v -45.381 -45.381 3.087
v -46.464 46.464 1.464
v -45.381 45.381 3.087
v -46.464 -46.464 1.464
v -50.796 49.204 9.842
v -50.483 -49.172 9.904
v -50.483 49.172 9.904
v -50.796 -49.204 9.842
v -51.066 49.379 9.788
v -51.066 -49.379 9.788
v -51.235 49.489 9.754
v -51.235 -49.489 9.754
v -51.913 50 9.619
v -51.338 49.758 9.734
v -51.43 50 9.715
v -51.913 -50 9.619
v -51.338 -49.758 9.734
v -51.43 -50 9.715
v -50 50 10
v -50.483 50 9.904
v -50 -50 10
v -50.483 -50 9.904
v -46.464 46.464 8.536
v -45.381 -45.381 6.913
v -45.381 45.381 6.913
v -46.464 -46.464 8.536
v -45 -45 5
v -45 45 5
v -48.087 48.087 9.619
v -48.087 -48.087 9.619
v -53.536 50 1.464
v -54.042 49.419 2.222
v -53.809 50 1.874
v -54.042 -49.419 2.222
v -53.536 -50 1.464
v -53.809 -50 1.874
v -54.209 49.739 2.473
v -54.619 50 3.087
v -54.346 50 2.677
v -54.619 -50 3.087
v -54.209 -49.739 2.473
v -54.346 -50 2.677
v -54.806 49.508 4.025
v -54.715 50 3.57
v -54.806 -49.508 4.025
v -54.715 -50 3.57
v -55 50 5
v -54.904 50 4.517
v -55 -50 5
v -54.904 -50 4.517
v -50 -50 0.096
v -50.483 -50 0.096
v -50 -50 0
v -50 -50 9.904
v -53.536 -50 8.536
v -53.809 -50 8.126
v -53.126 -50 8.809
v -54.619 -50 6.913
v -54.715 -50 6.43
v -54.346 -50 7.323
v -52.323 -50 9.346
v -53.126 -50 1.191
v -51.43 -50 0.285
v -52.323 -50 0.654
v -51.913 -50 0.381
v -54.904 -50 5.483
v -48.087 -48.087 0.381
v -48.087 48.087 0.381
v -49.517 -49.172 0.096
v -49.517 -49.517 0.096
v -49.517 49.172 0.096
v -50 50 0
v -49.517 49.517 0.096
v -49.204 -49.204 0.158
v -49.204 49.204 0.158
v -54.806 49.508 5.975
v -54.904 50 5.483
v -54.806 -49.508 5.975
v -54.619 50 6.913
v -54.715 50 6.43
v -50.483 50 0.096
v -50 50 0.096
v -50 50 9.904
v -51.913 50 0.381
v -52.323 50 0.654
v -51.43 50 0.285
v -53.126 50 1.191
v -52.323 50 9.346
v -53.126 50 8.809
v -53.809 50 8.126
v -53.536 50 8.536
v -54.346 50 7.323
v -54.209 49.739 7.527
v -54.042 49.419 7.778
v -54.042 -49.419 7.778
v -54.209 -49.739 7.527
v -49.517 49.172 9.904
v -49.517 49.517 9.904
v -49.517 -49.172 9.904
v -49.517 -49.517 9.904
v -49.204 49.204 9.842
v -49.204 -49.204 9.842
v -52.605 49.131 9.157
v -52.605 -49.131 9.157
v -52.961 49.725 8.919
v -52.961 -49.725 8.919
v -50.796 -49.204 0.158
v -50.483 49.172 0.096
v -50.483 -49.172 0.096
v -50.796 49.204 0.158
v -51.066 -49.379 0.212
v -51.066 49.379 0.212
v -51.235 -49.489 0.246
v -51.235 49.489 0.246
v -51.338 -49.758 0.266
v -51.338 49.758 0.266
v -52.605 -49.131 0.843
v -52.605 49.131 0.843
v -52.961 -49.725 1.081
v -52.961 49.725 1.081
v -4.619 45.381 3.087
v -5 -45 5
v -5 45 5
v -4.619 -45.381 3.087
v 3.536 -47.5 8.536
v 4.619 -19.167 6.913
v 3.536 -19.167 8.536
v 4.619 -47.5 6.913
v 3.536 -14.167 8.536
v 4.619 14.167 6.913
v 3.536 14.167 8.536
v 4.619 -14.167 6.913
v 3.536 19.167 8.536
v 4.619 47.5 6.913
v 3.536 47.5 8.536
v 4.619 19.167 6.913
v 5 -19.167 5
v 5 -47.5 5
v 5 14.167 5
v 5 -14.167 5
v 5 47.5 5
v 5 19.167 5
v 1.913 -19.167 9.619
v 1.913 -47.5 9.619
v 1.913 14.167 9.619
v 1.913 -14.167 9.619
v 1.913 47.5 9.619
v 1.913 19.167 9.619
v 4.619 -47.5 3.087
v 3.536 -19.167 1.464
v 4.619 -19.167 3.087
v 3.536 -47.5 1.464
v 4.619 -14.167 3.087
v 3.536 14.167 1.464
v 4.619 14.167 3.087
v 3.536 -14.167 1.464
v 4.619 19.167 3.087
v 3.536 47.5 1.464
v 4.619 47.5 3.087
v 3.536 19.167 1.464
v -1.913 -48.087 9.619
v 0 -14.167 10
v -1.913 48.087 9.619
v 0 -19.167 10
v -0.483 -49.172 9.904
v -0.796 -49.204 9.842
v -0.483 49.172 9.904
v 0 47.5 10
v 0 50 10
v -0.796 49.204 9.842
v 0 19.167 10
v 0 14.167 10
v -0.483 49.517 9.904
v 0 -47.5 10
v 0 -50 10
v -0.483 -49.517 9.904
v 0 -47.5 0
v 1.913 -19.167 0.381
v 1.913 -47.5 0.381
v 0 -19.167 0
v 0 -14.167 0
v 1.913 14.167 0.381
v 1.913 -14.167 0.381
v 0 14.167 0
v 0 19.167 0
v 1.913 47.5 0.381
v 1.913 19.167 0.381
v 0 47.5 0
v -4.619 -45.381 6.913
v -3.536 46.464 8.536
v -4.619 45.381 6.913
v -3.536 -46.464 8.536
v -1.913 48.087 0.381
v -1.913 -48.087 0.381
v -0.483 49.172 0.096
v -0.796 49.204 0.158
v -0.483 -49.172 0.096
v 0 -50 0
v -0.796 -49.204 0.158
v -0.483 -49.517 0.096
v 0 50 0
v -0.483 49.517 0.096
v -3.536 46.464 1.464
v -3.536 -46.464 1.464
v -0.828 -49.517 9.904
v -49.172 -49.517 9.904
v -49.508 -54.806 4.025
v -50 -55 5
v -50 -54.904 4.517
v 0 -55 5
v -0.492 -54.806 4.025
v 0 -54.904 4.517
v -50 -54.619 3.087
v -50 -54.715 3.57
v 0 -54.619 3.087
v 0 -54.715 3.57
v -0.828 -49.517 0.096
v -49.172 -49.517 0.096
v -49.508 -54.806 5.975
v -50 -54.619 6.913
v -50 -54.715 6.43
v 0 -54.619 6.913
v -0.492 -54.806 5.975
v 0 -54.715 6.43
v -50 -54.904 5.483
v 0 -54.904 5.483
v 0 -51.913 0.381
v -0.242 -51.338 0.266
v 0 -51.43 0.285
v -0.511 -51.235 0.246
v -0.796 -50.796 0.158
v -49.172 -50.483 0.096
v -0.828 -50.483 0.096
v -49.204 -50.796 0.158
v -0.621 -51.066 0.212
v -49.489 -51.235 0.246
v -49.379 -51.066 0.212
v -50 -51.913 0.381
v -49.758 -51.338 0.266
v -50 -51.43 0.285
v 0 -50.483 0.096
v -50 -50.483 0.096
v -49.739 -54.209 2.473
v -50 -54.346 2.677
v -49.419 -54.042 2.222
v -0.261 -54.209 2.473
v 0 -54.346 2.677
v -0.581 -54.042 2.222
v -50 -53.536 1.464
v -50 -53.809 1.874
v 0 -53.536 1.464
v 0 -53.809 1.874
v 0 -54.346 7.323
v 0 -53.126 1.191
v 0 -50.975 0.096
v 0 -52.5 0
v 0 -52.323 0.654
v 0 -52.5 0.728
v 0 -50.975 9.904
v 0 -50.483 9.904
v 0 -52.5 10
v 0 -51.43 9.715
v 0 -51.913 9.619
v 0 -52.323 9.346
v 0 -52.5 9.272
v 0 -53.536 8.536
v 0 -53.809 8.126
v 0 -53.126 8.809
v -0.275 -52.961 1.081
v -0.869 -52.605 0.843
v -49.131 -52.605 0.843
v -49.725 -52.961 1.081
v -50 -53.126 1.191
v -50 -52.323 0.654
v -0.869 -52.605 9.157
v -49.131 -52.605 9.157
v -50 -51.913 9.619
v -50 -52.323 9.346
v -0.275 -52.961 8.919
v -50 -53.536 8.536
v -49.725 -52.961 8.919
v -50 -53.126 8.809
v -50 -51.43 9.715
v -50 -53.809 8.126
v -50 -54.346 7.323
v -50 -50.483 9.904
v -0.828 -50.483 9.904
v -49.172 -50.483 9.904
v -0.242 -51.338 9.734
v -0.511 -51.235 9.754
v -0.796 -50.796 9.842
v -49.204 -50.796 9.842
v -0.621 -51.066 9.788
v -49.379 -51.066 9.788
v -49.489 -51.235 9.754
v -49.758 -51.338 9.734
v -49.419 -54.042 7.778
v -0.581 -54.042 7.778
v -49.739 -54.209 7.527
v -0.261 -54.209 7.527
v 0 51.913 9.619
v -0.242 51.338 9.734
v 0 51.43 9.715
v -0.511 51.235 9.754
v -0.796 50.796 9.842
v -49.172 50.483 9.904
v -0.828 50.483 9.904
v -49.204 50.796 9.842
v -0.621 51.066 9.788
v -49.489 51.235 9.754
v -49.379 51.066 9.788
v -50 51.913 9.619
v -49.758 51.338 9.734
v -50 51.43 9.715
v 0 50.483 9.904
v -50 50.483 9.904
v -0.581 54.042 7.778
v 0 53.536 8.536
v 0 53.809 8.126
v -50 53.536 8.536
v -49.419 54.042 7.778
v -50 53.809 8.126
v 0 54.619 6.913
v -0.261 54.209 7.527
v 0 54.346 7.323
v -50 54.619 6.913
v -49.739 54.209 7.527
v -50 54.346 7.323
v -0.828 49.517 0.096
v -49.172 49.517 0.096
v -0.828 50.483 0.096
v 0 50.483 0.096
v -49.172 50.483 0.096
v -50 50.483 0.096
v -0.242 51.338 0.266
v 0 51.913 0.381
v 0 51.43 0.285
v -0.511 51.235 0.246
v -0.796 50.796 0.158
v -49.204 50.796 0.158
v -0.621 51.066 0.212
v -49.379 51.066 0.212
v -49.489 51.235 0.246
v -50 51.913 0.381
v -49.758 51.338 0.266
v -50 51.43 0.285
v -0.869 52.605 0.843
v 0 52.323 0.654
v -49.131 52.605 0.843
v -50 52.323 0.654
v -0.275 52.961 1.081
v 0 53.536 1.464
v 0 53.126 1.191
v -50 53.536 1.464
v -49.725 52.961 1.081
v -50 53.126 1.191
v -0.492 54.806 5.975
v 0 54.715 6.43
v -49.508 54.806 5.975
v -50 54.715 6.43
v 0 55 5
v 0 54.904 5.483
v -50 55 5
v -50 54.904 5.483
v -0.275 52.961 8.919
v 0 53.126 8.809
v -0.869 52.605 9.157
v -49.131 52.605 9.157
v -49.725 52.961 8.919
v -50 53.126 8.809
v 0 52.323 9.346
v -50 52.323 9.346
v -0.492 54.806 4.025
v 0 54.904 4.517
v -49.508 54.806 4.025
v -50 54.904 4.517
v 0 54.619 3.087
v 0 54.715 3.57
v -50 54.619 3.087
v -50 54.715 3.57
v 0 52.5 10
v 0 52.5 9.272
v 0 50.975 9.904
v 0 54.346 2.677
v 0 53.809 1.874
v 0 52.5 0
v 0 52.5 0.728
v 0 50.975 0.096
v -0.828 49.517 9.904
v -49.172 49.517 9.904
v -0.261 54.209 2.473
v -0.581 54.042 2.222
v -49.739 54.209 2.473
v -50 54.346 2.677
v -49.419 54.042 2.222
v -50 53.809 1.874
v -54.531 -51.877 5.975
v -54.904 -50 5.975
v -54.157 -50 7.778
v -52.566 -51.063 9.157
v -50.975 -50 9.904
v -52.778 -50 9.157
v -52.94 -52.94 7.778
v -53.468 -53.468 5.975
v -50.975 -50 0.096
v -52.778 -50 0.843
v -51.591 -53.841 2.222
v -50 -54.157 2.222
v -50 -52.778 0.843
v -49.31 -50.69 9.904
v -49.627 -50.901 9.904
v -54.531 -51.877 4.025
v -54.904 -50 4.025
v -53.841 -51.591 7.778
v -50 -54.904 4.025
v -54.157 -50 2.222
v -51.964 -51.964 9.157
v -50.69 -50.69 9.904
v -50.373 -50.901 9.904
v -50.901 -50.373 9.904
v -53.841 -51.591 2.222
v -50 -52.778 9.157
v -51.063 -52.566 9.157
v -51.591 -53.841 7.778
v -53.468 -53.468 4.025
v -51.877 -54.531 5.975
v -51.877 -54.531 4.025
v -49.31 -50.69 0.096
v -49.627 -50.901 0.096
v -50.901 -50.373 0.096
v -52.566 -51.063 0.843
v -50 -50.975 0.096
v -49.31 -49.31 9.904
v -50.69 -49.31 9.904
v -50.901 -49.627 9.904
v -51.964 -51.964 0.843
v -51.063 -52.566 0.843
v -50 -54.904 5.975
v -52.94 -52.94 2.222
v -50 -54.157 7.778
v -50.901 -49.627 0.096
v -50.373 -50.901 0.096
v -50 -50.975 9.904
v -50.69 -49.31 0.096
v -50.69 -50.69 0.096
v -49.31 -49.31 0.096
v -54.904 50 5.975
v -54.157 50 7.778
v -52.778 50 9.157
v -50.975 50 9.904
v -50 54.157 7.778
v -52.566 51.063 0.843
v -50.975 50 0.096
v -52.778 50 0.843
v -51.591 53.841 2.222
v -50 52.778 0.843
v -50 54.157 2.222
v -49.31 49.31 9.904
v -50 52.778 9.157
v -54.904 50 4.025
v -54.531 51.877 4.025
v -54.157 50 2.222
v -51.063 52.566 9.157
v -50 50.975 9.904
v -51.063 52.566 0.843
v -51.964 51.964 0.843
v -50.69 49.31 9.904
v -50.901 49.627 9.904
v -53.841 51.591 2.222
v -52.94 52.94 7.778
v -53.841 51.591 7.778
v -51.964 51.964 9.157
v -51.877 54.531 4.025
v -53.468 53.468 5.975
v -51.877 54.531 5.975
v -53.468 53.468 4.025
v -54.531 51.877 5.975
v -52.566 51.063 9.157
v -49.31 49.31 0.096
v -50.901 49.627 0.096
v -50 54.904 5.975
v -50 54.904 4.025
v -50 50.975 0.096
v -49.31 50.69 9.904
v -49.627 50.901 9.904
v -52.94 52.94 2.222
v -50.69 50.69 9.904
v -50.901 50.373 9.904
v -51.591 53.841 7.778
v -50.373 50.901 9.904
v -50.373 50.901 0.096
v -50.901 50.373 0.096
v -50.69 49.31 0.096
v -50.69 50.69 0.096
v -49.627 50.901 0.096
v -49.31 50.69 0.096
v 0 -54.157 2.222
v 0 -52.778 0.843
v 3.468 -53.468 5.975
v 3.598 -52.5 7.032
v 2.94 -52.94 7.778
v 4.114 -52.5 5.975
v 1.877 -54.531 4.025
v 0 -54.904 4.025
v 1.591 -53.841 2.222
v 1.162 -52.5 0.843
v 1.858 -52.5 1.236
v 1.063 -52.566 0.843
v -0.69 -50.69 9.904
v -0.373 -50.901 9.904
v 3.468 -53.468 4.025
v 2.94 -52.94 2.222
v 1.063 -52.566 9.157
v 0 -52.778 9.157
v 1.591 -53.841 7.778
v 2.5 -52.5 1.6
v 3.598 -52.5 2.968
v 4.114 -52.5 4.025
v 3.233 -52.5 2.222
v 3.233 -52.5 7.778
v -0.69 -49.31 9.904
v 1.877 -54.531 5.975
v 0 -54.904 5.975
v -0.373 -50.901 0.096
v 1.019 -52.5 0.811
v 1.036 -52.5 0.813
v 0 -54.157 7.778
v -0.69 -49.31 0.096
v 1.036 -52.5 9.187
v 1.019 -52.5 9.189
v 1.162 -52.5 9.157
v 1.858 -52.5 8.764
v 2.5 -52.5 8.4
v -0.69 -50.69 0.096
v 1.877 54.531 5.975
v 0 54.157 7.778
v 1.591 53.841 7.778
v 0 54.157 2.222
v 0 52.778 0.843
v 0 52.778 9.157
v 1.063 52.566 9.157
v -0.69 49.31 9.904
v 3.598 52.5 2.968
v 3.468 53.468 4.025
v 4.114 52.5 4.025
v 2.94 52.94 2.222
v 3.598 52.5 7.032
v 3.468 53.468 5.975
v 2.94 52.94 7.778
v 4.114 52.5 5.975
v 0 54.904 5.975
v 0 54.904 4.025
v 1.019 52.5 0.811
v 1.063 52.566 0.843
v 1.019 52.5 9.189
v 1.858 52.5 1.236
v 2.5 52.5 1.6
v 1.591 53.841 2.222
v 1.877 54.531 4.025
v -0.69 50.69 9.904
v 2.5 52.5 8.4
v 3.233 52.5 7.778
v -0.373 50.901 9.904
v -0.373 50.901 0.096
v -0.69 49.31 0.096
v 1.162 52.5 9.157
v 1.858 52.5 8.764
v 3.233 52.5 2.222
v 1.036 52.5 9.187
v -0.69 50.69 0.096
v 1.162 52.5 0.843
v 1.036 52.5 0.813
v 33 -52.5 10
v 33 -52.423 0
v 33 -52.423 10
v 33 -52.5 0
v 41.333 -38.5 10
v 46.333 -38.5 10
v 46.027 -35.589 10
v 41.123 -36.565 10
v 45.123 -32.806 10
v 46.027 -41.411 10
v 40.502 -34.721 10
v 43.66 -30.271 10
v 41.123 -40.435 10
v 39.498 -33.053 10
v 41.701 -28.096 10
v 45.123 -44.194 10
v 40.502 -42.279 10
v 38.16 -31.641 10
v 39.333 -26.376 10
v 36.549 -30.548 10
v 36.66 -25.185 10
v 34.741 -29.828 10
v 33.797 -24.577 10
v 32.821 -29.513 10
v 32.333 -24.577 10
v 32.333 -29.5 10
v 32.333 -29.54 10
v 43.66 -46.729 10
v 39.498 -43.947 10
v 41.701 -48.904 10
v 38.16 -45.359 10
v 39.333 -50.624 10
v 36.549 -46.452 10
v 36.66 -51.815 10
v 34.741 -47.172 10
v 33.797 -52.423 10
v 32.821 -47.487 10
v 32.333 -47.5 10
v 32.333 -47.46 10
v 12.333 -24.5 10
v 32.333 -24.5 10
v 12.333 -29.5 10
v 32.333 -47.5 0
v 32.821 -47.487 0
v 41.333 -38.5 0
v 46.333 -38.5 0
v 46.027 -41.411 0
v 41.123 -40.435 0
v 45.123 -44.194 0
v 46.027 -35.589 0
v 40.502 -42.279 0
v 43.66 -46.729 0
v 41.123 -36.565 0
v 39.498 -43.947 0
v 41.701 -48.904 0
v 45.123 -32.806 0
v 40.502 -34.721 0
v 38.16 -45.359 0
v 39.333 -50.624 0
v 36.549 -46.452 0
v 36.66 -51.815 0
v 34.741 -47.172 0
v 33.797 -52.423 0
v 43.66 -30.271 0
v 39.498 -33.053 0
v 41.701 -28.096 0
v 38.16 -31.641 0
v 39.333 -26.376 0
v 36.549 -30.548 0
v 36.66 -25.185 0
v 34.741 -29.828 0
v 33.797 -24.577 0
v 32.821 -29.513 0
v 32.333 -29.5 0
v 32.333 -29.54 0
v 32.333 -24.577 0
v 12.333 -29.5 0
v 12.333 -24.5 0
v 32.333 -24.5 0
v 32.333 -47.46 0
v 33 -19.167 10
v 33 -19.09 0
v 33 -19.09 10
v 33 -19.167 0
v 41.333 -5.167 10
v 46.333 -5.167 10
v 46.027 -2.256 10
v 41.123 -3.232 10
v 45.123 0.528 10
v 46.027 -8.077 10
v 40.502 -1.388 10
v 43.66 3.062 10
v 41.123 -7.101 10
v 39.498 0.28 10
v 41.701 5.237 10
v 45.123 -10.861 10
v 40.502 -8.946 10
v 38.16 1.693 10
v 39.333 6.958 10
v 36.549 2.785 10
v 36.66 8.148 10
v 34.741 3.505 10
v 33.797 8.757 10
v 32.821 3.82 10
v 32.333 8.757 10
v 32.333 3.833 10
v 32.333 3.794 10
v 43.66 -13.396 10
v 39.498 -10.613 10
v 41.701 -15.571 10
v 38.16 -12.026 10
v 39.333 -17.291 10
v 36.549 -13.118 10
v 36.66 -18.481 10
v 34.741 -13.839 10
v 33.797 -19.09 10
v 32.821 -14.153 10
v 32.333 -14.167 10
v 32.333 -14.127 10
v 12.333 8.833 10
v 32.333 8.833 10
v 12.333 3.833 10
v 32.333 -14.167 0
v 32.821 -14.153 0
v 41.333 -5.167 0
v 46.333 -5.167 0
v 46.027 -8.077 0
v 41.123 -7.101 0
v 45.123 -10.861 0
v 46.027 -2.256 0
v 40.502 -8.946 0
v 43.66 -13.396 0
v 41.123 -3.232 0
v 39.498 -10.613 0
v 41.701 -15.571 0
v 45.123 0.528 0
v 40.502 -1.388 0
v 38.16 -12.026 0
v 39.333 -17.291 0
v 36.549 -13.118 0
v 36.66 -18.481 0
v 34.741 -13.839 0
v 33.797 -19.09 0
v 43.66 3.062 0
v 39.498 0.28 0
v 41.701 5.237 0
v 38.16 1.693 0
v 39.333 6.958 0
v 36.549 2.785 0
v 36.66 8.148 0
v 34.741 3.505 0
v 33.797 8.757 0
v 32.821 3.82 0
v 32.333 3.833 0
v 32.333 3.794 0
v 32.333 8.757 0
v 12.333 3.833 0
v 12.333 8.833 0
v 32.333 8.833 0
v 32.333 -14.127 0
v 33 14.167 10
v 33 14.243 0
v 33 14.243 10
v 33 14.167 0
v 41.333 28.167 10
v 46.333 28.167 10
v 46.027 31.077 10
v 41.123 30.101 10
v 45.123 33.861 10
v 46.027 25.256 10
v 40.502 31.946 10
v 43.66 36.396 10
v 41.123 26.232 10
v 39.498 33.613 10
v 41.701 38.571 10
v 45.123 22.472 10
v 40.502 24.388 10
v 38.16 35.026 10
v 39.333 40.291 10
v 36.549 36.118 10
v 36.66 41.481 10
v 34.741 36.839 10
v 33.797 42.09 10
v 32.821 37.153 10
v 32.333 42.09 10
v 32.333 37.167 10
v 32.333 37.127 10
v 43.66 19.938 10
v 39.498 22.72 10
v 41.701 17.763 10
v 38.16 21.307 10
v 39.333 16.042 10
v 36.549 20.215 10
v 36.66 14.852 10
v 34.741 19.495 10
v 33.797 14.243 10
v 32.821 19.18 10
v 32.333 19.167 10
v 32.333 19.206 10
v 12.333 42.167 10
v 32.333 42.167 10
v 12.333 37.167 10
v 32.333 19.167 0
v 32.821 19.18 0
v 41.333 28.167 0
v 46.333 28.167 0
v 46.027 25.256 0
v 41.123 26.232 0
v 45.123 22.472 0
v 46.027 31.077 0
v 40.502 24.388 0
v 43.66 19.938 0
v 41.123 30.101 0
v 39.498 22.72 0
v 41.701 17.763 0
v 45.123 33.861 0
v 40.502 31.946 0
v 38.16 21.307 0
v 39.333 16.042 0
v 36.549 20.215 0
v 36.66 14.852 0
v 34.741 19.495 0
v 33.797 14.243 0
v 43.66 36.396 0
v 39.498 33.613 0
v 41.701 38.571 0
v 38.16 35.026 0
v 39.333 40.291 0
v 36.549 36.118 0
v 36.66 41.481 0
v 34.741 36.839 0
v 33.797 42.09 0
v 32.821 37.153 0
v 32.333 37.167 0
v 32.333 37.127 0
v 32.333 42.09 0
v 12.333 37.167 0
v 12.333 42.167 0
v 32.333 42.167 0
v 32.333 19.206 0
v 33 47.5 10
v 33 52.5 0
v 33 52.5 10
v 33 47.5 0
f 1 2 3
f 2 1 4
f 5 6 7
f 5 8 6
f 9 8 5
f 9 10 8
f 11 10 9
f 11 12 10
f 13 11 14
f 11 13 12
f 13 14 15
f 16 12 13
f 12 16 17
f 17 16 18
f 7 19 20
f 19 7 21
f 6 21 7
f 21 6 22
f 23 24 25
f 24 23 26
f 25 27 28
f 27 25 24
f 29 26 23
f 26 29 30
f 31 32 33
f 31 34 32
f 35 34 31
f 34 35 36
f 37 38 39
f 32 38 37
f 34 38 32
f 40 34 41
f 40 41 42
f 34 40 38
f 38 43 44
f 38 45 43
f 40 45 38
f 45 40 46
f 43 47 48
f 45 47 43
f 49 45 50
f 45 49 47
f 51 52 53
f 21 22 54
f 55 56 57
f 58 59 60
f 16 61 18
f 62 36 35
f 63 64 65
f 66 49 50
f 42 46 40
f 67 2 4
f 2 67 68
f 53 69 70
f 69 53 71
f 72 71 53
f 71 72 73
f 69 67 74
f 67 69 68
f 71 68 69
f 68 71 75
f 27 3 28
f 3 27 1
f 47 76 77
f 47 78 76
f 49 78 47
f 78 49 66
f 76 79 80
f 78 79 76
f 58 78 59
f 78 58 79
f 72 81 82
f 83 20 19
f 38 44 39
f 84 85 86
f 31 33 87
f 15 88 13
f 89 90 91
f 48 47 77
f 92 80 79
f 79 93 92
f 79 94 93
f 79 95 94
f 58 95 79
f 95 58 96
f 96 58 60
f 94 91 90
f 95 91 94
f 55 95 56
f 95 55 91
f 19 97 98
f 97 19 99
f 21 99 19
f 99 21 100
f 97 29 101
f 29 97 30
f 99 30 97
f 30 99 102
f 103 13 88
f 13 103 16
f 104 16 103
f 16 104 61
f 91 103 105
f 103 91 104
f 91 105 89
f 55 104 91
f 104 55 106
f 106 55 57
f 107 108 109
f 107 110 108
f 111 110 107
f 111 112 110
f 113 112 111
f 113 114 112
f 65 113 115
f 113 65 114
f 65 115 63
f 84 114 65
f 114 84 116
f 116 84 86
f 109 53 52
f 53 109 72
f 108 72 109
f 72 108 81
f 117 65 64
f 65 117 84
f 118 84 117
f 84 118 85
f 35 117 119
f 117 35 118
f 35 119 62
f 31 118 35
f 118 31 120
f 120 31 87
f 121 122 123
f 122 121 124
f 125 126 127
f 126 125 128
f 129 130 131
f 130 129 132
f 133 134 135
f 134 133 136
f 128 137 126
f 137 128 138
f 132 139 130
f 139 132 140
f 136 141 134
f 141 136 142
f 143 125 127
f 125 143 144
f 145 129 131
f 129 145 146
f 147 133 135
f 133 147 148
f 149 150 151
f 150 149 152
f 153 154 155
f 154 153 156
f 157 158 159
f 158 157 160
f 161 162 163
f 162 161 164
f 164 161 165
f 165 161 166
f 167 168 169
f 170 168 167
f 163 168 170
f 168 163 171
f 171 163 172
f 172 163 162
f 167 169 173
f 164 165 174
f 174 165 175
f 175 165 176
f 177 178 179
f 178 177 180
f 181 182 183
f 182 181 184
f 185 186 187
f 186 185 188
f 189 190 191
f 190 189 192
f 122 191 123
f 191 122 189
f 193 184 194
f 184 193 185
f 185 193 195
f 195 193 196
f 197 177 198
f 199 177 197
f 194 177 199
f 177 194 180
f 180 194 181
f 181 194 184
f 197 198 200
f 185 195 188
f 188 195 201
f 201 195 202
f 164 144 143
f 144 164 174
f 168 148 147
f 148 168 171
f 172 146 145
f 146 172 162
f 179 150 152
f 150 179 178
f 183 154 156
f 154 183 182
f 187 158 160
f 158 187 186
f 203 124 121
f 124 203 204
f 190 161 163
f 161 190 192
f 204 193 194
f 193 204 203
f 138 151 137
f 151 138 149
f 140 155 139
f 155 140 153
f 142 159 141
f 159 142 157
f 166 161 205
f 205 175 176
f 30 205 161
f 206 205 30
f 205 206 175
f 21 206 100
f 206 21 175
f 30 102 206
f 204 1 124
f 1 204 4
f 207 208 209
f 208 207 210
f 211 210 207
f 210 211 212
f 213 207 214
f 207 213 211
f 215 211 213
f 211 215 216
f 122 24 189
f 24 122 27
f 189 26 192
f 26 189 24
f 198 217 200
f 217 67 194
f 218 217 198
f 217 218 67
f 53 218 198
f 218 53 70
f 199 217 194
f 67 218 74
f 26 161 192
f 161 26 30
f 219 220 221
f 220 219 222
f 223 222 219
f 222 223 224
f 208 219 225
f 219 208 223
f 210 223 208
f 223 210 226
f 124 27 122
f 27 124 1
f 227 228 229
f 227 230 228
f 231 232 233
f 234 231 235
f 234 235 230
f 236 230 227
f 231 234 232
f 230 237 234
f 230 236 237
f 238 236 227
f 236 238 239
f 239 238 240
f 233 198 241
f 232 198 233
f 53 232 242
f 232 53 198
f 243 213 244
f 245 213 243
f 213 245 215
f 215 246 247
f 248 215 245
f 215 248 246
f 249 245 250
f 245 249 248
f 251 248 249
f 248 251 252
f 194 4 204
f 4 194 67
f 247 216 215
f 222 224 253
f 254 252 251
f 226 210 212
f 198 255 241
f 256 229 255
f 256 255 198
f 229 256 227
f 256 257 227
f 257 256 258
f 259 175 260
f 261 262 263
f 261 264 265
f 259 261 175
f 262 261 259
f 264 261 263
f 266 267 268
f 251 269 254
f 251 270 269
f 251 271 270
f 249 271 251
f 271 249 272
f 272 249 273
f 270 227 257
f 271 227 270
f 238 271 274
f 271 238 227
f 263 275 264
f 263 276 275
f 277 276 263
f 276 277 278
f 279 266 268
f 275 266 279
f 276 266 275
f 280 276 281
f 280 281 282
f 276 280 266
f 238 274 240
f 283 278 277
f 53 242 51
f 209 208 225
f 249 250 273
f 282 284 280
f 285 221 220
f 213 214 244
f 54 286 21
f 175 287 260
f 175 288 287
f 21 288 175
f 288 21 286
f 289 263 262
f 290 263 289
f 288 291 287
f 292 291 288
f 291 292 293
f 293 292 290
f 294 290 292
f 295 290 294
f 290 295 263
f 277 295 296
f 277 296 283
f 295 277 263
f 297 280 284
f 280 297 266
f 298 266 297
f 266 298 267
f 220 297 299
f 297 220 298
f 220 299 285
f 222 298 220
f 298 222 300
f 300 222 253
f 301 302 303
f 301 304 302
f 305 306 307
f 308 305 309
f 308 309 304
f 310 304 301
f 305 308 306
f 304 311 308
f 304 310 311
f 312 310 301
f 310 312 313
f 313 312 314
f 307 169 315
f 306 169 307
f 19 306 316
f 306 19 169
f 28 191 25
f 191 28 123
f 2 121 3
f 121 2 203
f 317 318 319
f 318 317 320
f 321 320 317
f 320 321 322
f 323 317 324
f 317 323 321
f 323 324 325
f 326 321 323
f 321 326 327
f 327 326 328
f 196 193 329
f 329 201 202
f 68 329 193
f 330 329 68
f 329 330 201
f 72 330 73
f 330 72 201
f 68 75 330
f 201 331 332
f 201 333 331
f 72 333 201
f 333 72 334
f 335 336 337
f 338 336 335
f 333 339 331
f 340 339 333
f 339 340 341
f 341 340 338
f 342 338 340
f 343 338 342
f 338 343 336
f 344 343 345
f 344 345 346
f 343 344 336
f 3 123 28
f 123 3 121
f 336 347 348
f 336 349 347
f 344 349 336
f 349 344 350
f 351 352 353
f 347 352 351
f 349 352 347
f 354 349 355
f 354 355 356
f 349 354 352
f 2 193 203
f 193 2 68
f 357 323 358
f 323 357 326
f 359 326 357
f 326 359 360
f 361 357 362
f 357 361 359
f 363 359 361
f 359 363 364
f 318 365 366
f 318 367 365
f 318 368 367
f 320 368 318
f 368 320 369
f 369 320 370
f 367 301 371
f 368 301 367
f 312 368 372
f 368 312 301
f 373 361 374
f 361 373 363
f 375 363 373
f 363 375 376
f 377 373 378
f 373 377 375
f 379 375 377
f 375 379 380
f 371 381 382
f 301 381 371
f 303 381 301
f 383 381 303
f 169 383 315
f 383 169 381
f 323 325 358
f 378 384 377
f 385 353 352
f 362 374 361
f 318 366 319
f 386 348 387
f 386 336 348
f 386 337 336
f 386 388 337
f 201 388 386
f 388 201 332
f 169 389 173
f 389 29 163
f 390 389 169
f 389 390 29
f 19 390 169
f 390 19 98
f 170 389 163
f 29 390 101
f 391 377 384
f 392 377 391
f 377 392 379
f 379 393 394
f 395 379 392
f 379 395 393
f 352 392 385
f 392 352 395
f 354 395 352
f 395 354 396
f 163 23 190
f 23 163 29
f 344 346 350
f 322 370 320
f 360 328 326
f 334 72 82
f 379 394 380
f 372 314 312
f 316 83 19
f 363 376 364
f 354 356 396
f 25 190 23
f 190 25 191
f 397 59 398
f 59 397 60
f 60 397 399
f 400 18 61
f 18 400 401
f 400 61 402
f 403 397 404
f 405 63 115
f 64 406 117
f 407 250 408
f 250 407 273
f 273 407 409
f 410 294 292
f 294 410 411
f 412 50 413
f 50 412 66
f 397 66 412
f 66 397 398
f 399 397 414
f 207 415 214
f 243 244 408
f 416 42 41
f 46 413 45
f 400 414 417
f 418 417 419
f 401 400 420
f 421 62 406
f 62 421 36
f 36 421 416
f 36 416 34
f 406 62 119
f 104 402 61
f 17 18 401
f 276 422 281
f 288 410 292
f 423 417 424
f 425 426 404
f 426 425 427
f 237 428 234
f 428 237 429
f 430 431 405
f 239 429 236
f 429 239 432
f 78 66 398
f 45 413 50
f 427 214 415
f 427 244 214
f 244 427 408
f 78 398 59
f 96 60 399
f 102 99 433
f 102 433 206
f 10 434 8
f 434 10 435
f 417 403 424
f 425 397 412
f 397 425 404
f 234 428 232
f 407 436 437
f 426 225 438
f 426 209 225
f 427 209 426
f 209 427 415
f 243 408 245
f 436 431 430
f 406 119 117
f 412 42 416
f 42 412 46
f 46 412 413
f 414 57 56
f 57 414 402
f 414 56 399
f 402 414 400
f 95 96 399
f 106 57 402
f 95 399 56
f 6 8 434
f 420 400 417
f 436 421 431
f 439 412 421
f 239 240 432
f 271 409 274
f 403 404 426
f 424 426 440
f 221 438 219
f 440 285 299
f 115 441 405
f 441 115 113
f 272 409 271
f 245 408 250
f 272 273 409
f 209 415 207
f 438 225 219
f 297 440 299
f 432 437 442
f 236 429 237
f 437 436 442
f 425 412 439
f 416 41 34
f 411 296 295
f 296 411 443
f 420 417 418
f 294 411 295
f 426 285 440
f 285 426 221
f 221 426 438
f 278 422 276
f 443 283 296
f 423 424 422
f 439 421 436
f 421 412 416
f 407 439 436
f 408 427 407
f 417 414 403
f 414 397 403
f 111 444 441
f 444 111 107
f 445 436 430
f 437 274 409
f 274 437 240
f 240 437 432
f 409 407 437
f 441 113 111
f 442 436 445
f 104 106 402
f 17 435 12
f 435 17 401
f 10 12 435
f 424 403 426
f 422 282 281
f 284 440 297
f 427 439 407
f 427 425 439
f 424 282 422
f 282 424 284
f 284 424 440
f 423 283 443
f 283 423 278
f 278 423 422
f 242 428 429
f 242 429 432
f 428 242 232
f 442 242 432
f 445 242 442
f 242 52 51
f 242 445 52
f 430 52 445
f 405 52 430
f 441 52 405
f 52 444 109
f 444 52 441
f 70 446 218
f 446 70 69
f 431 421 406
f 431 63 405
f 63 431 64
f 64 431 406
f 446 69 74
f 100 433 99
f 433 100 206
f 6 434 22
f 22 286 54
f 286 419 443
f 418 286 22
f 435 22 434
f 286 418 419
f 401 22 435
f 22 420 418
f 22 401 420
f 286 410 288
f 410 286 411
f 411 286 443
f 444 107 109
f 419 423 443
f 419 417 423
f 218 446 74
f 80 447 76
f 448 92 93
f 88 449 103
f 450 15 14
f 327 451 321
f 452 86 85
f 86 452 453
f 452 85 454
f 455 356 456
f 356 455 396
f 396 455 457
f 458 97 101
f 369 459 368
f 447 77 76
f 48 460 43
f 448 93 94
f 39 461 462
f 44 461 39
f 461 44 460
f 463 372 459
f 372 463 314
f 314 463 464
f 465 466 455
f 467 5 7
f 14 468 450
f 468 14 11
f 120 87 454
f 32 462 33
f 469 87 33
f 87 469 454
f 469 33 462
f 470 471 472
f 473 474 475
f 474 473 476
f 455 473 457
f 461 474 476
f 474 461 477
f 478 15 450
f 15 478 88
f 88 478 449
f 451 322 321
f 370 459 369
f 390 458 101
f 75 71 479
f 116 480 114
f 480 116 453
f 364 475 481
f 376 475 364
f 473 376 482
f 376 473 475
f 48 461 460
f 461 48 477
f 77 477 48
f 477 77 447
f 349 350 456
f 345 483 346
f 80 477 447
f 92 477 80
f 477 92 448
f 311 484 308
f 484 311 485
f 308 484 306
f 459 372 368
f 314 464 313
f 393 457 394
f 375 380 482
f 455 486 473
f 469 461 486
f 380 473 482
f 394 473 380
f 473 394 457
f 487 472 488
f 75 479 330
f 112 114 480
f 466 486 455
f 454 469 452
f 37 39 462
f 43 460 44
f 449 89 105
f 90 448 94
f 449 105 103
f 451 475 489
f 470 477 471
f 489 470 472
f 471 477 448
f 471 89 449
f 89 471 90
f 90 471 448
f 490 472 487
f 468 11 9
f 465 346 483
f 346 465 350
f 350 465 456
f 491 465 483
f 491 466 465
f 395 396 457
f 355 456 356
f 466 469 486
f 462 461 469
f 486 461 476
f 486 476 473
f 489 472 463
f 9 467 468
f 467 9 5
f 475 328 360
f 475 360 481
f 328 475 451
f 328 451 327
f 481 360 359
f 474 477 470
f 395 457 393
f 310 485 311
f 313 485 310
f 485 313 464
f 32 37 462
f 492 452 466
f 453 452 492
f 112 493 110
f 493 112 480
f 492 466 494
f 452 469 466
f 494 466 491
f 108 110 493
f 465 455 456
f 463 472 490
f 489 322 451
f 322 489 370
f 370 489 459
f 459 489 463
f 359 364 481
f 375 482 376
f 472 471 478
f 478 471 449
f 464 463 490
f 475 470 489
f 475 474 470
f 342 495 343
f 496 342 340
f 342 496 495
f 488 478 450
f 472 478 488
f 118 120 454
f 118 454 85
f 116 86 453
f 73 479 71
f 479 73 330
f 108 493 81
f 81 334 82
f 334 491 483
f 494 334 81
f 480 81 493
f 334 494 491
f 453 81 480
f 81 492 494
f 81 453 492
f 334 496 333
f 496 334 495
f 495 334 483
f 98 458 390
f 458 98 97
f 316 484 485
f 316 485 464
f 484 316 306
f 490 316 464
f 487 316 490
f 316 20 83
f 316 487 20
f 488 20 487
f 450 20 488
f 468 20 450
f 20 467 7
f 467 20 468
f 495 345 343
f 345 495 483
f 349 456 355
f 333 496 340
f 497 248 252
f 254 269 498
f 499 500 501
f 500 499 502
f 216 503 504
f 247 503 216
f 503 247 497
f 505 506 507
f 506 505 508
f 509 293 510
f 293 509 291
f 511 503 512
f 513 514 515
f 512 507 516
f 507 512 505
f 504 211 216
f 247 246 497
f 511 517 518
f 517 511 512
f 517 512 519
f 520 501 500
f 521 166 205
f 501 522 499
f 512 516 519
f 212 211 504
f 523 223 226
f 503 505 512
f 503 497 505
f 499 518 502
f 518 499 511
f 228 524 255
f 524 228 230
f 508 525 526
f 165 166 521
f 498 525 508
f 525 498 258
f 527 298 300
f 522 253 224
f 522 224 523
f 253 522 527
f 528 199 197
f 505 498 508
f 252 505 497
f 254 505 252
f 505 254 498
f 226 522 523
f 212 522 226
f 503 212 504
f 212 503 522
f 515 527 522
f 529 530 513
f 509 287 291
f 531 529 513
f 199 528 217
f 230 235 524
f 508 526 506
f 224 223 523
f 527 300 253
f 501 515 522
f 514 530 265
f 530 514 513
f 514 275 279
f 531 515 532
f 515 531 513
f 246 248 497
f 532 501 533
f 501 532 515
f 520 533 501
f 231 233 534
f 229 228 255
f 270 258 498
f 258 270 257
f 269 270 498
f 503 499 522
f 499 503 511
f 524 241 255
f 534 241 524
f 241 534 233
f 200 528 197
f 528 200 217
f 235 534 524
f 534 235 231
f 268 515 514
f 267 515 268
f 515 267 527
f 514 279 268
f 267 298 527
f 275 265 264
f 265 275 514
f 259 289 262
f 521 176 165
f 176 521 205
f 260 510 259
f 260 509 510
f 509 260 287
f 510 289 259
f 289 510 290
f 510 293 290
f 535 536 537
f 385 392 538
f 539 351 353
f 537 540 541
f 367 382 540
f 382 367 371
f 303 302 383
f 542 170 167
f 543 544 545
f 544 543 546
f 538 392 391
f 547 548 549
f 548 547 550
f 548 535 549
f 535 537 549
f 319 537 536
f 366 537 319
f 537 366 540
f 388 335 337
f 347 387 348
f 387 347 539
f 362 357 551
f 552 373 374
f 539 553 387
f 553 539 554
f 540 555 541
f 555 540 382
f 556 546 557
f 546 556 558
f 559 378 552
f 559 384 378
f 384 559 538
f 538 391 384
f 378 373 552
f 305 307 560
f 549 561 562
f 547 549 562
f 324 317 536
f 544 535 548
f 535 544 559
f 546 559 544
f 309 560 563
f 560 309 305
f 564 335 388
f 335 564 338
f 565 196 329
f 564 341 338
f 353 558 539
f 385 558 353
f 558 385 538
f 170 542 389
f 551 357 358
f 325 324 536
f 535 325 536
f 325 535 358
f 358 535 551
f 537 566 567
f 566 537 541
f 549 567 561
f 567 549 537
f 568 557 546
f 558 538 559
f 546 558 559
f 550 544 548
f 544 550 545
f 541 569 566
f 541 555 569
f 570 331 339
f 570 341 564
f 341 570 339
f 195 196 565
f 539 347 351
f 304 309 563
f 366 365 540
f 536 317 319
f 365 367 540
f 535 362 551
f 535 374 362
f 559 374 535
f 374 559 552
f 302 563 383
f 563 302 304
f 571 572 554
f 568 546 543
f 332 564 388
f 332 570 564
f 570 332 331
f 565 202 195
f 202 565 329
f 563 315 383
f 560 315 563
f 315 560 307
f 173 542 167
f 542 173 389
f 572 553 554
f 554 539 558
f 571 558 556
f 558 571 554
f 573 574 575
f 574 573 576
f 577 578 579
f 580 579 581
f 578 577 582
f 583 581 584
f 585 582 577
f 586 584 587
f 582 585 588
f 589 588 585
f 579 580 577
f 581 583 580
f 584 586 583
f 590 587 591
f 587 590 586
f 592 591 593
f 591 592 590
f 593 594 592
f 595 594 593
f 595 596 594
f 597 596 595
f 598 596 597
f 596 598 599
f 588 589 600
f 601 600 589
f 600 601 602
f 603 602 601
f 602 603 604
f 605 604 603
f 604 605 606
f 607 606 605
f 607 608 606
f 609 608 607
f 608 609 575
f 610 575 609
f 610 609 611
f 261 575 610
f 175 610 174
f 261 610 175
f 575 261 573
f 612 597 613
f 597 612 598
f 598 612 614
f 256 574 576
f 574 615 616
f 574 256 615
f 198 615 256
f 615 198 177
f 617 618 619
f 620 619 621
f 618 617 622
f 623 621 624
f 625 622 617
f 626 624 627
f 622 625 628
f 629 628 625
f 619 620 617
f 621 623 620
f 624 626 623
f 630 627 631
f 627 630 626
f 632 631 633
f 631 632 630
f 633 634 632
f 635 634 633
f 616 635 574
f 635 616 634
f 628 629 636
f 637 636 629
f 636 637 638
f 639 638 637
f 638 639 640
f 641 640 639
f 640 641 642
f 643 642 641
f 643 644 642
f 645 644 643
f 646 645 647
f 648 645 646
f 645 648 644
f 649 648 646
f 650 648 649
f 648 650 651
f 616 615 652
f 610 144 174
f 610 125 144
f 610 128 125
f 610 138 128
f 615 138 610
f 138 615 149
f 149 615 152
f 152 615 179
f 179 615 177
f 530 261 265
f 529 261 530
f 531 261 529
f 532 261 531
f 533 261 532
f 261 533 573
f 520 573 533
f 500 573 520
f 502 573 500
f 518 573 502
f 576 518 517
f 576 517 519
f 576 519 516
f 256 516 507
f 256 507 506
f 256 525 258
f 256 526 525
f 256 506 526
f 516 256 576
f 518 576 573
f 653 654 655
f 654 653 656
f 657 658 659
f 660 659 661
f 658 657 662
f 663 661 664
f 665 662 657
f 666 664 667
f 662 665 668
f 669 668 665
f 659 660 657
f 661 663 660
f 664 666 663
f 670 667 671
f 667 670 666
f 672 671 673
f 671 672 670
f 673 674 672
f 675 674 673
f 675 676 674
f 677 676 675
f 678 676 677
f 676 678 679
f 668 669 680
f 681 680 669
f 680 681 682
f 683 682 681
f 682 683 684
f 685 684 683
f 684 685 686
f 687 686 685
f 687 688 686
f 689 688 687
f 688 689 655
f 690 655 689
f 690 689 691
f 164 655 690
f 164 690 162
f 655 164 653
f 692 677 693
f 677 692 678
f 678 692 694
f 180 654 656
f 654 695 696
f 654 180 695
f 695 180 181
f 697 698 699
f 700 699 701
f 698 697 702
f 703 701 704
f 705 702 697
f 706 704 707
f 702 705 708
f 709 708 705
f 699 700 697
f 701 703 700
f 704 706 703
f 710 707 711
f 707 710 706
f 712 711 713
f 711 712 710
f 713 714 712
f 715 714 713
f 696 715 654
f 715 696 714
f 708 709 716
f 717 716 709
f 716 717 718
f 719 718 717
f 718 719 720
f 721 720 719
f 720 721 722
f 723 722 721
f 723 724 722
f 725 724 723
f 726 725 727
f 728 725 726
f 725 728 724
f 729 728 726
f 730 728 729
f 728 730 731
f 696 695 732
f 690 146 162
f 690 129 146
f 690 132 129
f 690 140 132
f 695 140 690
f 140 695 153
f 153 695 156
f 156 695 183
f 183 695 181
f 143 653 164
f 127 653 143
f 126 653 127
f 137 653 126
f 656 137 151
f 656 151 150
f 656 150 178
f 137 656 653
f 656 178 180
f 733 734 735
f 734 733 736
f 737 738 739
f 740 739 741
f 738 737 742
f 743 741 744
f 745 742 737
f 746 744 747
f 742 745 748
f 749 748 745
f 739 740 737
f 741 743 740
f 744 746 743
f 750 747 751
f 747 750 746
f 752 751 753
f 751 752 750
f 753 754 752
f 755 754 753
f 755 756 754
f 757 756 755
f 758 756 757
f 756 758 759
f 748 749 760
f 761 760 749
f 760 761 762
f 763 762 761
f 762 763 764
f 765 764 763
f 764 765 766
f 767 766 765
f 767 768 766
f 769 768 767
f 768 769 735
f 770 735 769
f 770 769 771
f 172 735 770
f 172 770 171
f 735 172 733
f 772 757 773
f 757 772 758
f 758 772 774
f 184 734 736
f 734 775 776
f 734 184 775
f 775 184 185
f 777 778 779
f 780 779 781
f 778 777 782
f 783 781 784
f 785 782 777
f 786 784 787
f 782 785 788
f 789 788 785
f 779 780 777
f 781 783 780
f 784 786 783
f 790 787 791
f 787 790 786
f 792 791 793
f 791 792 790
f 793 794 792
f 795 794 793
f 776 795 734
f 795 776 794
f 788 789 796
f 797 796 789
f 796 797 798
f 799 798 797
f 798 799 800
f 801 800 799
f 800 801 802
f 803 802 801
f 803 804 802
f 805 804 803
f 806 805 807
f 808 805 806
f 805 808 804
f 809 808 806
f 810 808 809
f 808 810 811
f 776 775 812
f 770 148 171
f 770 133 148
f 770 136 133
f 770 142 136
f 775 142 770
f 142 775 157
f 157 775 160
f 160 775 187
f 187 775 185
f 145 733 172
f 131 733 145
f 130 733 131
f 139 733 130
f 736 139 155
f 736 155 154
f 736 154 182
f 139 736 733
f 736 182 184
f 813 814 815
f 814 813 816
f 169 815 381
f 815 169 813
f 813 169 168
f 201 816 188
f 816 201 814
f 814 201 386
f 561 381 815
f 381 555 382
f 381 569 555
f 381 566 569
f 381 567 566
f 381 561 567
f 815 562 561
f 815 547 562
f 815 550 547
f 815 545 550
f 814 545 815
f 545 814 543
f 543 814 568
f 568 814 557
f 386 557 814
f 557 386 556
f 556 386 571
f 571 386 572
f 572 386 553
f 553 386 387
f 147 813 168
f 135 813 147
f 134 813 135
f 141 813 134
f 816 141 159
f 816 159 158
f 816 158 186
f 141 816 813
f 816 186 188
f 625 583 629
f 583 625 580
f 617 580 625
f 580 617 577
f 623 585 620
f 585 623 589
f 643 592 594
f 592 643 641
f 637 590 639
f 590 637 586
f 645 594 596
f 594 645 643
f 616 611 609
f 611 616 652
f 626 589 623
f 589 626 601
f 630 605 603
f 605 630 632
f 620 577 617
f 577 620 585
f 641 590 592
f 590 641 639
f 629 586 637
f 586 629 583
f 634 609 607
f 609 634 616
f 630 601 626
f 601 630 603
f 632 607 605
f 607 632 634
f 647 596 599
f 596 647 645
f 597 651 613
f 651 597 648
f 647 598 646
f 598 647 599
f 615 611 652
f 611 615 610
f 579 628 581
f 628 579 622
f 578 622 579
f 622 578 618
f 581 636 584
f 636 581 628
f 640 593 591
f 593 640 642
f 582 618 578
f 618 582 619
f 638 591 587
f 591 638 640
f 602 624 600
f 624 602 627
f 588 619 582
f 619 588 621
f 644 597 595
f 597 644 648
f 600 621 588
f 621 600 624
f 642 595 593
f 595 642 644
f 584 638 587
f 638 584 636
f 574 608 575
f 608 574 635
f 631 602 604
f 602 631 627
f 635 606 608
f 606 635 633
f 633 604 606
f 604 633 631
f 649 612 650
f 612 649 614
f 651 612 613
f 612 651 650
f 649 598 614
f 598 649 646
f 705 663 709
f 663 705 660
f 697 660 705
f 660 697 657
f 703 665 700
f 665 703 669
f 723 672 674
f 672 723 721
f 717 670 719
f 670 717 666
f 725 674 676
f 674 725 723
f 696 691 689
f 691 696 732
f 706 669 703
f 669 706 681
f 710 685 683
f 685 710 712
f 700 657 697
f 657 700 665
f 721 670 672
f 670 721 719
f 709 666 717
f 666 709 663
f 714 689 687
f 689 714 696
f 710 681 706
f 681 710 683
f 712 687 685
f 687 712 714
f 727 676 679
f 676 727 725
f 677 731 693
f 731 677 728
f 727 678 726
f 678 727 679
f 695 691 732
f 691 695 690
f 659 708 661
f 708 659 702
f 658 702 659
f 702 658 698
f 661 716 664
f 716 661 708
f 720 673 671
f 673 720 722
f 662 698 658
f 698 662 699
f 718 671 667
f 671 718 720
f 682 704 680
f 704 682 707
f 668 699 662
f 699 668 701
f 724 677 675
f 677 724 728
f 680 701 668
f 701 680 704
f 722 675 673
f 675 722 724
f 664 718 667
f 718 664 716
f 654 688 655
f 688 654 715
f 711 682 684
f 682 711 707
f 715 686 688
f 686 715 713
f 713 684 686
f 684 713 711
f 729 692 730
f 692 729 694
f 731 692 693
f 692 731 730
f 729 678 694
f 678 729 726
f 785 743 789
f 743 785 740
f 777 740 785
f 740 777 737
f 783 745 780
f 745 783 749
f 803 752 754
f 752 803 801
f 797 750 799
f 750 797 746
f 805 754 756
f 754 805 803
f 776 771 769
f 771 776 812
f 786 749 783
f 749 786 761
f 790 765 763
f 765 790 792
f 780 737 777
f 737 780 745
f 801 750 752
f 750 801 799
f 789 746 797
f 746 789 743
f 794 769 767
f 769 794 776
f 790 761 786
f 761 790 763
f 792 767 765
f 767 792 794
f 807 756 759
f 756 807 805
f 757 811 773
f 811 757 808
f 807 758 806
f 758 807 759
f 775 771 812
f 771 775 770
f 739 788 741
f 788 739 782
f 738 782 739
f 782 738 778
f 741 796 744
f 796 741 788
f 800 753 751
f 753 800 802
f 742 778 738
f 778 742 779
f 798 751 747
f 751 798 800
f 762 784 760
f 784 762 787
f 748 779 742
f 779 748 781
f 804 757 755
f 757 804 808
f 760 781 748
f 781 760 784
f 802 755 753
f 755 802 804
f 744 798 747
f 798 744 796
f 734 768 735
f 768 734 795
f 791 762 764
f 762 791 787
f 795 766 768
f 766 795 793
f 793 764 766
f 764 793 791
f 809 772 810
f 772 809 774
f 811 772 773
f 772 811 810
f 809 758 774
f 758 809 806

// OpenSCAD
// Global Parameters
width     = 100;
height    = 100;
thickness =  10;

module bagcarrier() {

    difference() {

        // Things that exist
        union() {

            // handle and underbar
            for(x = [-height/2, 0]) {
                translate( v = [x, width/2, thickness/2] ) {
                    rotate( a = [90, 0, 0] ) {
                        cylinder( h = width, r = thickness/2 ); 
                    }
                }
            }

            // left and right bars
            for(y = [-width/2, width/2]) {
                translate( v = [-height/2, y, thickness/2] ) {
                    rotate( a = [0, 90, 0] ) {
                        cylinder( h = height * 0.5, r = thickness/2 ); 
                    }
                }
            }

            // Rounded corners for top and middle bars
            for(x = [-height/2, 0]) {
                for(y = [-width/2, width/2]) {
                    translate( v = [x, y, thickness/2] ) {
                        sphere( r = thickness/2 );
                    }
                }
            }

            // lower bars
            for( y = [-width/2 - thickness/4, -width/2 + width/3 - thickness/4, width/2 - width/3 - thickness/4, width/2 - thickness/4]) {
                // bars
                translate( v = [0, y, 0] ) {
                   cube( size = [ height * 0.33, thickness/2, thickness ] ); 
                }
            }

            // hoops
            for( y = [ -width/2 + width * 0.14 - thickness/4, -width/2 + width * 0.14 + width/3 - thickness/4, width/2 + width * 0.14 - width/3 - thickness/4]) {
                translate( v = [height/2 - height/6 - 1, y, 0] ) {
                    union() {
                        difference() {
                            cylinder( h = thickness, r = width * 0.14);
                            union() {
                                // remove centre of hoop
                                cylinder( h = thickness, r = width * 0.14 - thickness/2 );
                                // remove top half of hoop
                                translate( v = [-width/6,-width * 0.14,0] ) {
                                    cube( size = [ width/6, width/6*2, thickness ] );
                                }
                            }
                        }
                        // the extra bit above the hoop
                        translate( v = [-height/5,width * 0.14 - thickness/2,0] ) {
                            cube( size = [ height/5, thickness/2, thickness ] );
                        }
                    }
                }
            }

        }

    }

}

bagcarrier();
